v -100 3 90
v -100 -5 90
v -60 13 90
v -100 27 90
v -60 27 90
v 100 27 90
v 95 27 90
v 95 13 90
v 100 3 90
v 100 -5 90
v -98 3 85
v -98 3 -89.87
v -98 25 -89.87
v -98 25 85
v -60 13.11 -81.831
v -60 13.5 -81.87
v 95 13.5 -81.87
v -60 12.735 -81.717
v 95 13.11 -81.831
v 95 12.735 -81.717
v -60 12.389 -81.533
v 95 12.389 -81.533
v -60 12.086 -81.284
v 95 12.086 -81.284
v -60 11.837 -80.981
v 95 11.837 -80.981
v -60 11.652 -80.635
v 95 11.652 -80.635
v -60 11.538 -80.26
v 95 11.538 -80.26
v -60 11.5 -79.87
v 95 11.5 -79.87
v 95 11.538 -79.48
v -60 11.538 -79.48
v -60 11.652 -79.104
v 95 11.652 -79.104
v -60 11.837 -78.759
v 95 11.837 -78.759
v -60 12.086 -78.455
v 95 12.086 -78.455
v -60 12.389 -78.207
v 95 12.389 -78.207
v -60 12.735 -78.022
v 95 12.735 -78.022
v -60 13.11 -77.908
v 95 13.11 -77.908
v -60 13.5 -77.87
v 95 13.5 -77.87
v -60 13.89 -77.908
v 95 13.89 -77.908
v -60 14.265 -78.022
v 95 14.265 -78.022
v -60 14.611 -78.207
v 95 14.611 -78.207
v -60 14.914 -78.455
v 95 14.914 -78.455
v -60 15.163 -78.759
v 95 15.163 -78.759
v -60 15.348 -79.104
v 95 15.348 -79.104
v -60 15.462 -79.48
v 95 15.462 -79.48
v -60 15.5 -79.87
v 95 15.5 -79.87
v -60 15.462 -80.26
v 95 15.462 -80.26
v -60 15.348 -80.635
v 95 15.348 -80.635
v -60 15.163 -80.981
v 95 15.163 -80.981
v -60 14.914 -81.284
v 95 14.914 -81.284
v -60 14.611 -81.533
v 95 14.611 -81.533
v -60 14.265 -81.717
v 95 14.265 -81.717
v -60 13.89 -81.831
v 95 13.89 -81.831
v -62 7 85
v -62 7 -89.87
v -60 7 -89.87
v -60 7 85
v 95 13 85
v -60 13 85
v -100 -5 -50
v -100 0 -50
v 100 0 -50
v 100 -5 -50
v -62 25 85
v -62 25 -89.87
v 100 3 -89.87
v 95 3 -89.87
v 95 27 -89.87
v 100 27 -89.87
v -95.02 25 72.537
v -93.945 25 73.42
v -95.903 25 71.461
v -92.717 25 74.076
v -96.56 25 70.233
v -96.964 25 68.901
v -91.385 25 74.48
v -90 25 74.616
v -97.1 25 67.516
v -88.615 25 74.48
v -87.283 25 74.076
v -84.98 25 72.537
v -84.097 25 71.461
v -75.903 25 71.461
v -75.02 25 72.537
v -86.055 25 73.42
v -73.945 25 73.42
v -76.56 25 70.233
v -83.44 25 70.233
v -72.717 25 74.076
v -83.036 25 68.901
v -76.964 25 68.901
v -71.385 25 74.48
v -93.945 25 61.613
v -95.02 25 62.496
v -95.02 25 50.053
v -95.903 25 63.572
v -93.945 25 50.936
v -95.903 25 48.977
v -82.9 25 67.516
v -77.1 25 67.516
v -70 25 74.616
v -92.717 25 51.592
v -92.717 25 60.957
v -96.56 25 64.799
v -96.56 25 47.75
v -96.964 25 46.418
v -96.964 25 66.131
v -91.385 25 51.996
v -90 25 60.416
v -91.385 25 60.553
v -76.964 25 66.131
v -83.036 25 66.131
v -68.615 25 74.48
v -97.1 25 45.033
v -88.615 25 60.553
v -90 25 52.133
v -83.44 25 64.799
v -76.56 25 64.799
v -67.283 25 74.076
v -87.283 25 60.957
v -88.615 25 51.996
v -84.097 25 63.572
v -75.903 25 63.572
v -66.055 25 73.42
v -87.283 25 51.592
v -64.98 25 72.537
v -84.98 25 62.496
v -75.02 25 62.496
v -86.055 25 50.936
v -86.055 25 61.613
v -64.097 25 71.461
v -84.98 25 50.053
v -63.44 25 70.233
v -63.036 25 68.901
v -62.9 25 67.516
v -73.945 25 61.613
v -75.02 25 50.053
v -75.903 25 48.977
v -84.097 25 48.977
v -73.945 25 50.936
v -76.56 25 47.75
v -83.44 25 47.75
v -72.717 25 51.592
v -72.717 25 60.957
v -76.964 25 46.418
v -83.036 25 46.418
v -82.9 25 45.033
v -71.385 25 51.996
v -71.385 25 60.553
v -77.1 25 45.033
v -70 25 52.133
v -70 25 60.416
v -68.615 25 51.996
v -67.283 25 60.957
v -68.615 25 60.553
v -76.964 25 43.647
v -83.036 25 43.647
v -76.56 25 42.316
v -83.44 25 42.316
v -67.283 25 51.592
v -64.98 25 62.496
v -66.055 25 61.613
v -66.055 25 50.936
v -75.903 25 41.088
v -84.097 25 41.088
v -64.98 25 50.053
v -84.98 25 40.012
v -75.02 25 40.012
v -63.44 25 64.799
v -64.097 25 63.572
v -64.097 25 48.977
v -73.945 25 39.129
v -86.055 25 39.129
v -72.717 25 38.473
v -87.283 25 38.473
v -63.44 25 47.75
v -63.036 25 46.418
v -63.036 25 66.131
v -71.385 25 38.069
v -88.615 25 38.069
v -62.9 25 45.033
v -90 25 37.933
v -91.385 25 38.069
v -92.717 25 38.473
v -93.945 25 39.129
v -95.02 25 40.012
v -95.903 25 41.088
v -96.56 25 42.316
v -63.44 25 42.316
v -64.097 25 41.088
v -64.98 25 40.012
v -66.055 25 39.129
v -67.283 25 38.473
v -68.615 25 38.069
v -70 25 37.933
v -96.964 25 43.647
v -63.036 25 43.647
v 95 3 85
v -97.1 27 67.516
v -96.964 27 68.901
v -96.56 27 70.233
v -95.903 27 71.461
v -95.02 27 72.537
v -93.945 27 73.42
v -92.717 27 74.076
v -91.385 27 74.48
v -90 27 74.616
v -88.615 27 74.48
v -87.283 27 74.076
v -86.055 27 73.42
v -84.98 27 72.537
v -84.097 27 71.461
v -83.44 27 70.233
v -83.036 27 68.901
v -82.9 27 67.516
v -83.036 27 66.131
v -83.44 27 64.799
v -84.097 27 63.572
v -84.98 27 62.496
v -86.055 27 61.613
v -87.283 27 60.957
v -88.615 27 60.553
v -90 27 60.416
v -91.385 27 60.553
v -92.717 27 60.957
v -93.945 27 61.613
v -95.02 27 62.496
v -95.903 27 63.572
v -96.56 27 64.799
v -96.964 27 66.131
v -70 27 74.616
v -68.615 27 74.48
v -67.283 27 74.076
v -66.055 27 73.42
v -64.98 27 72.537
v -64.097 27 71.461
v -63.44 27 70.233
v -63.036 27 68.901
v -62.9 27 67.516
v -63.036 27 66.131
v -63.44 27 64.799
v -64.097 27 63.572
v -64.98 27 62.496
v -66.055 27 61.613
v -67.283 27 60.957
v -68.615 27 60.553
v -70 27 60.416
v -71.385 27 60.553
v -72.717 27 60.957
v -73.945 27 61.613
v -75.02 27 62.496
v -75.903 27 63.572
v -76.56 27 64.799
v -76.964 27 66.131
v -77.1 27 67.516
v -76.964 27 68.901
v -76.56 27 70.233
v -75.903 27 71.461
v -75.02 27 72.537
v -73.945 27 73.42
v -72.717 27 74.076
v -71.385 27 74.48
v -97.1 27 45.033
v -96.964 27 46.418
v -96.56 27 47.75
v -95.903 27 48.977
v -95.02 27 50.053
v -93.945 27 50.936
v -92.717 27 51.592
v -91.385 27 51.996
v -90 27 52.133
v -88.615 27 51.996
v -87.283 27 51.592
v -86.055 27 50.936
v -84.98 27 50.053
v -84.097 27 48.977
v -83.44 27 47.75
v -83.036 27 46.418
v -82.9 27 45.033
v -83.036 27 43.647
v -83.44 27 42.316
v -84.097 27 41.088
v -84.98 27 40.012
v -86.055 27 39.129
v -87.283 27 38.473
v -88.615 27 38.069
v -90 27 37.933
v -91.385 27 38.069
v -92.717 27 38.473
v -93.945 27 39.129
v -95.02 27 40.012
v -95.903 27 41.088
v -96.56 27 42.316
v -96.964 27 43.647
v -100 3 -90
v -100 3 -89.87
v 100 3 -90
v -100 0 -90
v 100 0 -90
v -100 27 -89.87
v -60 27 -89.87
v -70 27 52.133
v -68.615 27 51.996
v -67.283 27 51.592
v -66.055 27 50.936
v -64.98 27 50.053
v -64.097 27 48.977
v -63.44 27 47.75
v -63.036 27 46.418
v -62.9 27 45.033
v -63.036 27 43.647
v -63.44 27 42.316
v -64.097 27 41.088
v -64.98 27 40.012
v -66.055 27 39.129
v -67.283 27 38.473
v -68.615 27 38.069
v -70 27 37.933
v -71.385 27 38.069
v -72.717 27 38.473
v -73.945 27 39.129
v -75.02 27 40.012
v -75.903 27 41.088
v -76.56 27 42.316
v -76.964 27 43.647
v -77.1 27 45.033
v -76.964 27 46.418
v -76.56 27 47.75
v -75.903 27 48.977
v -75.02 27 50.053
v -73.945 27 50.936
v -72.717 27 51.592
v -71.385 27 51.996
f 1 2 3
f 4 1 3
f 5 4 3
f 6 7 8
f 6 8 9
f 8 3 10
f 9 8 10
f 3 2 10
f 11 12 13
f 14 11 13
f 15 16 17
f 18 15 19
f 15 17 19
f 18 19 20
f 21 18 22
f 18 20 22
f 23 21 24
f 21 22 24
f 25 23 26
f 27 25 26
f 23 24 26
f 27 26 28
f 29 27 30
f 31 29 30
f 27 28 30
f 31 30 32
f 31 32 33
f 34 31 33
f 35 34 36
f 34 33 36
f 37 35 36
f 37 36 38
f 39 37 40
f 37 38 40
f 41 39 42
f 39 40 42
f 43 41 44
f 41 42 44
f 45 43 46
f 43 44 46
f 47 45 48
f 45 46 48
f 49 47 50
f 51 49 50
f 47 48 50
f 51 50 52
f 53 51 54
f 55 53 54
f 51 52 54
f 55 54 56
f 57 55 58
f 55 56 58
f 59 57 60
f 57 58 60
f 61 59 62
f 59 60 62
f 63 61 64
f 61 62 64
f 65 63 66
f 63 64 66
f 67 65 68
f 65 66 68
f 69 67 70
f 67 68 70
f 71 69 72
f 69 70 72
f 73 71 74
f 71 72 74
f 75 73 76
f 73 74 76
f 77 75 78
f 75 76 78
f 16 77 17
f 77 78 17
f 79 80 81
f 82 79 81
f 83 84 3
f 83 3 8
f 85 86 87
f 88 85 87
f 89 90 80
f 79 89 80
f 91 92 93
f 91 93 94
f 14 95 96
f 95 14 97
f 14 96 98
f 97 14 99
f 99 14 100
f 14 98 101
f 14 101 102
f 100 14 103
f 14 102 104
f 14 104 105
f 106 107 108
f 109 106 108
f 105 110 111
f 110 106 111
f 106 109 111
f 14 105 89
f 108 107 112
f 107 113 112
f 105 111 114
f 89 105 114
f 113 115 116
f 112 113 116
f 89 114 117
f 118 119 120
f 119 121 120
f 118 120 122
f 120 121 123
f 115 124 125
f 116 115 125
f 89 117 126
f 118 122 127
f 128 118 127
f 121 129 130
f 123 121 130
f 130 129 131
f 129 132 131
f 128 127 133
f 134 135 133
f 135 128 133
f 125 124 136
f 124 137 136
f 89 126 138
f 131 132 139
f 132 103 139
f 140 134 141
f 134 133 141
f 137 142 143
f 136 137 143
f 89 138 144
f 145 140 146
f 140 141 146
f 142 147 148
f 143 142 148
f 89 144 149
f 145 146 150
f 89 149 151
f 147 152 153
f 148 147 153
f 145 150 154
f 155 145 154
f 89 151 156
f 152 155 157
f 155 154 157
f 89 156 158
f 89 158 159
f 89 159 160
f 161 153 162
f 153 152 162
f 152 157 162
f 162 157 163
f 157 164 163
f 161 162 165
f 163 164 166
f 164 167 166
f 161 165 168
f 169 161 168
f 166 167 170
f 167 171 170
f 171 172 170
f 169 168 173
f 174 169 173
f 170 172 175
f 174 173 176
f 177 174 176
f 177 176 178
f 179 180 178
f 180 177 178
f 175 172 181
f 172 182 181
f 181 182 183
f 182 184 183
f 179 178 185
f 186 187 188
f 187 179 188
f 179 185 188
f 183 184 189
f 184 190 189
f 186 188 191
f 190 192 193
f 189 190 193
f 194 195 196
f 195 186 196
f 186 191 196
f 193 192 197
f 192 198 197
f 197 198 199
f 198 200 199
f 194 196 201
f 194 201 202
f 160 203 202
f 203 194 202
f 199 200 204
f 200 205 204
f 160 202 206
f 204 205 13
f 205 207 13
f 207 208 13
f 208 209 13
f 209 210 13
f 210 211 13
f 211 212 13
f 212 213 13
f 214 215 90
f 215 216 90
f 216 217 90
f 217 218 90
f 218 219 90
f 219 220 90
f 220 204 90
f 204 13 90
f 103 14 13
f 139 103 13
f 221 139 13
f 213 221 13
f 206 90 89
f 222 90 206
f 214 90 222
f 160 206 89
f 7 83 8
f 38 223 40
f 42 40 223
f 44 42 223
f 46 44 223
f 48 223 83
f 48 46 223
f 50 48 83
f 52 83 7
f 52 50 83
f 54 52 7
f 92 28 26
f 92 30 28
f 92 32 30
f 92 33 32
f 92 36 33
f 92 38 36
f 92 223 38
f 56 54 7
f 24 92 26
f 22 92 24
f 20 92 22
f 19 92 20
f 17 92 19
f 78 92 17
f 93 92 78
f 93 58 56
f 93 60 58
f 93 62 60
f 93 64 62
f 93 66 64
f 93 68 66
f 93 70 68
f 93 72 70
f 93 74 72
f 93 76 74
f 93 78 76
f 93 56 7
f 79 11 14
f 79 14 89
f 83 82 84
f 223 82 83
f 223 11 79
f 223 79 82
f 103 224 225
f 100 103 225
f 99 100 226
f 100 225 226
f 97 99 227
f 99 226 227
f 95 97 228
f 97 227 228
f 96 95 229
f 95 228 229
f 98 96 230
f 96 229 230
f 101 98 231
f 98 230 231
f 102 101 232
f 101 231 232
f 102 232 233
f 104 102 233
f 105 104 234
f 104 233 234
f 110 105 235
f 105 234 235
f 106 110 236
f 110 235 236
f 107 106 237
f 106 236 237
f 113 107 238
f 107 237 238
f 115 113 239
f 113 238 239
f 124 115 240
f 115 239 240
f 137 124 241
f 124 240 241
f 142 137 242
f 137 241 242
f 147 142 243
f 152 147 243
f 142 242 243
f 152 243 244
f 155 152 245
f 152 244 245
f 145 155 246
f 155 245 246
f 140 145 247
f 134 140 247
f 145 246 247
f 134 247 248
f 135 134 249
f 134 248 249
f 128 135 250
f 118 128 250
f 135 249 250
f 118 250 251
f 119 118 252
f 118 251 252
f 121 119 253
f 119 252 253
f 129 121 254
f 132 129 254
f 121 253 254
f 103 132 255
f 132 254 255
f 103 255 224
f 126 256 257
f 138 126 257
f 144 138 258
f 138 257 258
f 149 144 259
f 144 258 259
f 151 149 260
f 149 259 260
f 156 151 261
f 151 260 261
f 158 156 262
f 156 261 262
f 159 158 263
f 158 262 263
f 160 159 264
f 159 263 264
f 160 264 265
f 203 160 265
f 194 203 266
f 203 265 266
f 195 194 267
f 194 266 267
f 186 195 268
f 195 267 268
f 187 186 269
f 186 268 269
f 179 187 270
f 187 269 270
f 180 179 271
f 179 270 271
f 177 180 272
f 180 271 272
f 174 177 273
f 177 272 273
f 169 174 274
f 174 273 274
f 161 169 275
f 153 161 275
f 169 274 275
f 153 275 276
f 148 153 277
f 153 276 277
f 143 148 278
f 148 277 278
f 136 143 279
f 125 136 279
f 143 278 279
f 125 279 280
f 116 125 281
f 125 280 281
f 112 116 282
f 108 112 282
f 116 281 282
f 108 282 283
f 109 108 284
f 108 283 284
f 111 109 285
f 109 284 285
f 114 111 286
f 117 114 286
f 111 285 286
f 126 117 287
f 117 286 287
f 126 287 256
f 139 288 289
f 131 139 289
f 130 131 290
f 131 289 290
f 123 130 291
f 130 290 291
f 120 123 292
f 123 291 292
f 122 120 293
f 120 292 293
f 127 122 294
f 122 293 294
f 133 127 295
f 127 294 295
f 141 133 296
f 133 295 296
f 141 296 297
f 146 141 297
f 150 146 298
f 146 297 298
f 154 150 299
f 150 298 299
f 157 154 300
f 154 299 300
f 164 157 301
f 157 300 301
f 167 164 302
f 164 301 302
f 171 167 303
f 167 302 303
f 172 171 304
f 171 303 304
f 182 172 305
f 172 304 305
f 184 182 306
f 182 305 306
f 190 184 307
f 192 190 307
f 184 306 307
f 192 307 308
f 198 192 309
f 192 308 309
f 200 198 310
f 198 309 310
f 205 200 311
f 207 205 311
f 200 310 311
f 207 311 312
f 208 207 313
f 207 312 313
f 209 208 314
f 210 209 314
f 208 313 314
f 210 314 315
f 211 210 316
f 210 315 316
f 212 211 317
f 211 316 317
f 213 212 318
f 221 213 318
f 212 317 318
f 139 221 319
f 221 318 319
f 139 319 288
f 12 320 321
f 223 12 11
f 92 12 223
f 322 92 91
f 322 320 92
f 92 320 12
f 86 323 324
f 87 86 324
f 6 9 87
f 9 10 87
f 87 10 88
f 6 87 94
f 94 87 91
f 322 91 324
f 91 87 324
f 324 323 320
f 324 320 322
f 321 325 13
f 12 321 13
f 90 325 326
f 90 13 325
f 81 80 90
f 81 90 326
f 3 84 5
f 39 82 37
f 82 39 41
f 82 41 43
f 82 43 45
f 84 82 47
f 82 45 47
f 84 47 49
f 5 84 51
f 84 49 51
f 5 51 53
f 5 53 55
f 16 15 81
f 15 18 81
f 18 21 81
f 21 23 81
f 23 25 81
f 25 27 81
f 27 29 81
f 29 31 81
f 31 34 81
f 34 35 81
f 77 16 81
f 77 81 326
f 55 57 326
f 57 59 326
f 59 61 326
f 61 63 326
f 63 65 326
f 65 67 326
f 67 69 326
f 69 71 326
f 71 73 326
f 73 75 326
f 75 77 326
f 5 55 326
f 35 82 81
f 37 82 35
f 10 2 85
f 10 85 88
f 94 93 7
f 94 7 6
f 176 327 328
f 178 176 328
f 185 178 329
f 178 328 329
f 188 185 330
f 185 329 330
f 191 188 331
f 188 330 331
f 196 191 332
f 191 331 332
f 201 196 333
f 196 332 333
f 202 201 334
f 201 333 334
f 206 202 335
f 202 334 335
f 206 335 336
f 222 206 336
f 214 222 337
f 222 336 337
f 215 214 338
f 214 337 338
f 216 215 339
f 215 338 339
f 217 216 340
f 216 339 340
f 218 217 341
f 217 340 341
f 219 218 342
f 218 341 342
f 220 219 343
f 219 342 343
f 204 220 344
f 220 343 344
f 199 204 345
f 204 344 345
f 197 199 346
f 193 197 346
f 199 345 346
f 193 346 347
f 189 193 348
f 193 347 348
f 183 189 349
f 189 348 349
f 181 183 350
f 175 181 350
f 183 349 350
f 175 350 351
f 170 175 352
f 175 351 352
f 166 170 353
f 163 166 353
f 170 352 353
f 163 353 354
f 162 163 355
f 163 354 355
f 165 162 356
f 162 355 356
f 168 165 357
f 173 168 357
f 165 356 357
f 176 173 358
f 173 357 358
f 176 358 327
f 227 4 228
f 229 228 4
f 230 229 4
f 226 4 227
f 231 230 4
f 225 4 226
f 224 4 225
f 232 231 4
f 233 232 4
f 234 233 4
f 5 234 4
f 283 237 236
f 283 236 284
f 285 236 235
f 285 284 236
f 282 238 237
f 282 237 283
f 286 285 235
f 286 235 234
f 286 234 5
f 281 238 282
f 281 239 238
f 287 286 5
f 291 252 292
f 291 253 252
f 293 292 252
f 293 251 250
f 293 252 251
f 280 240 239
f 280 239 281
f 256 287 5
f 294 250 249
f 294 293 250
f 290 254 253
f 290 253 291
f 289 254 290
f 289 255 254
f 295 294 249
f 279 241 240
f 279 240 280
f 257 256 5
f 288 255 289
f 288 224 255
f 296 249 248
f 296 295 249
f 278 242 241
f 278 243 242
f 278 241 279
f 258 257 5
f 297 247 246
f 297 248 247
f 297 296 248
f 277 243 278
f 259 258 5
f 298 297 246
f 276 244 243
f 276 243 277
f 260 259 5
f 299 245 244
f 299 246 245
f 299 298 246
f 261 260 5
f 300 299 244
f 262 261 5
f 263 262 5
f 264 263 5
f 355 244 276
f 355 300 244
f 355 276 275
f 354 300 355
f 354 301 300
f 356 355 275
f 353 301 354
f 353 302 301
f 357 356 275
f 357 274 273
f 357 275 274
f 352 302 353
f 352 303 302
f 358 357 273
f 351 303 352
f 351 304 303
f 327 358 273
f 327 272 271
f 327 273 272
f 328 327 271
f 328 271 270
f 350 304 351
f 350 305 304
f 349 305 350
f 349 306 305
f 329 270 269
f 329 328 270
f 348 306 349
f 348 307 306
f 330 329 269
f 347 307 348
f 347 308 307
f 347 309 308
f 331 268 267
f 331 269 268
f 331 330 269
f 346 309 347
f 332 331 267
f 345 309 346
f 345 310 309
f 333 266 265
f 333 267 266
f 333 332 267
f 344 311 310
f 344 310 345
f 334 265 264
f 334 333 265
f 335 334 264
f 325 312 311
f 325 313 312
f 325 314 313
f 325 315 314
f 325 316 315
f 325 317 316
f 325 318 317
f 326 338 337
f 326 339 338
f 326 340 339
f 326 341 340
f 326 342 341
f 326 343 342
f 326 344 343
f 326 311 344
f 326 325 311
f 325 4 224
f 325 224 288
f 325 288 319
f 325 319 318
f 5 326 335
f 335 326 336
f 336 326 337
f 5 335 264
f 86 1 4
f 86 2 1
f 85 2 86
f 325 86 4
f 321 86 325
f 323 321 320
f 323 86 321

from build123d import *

# Parameters (mm, degrees)
SKETCH1_W           = 200
SKETCH1_H           = 180
BOSS_EXTRUDE1_DEPTH = 3
SKETCH2_W           = 200
SKETCH2_H           = 140
BOSS_EXTRUDE2_DEPTH = 5
SKETCH6_W           = 200
SKETCH6_H           = 179.869705491
BOSS_EXTRUDE3_DEPTH = 24
SKETCH7_W           = 155
SKETCH7_H           = 24
CUT_EXTRUDE1_DEPTH  = 179.869705491
SKETCH8_R           = 2
BOSS_EXTRUDE4_DEPTH = 155
SKETCH9_W           = 155
SKETCH9_H           = 5
BOSS_EXTRUDE5_DEPTH = 10
CUT_EXTRUDE3_DEPTH  = 174.869705491
SKETCH12_R          = 7.1
CUT_EXTRUDE4_DEPTH  = 2


with BuildPart() as part:
    # Sketch1 → Boss-Extrude1 (new body)
    with BuildSketch(Plane(origin=(0, 0, 0), x_dir=(1, 0, 0), z_dir=(0, 1, 0))):
        Rectangle(SKETCH1_W, SKETCH1_H)
    extrude(amount=BOSS_EXTRUDE1_DEPTH)

    # Sketch2 → Boss-Extrude2 (add)
    with BuildSketch(Plane.XZ):
        with Locations((0, 20)):
            Rectangle(SKETCH2_W, SKETCH2_H)
    extrude(amount=BOSS_EXTRUDE2_DEPTH)

    # Sketch6 → Boss-Extrude3 (add)
    with BuildSketch(Plane(origin=(0, 3, 0), x_dir=(1, 0, 0), z_dir=(0, 1, 0))):
        with Locations((0, -0.065147254)):
            Rectangle(SKETCH6_W, SKETCH6_H)
    extrude(amount=BOSS_EXTRUDE3_DEPTH)

    # Sketch7 → Cut-Extrude1 (cut)
    with BuildSketch(Plane(origin=(0, 0, -89.869705491), x_dir=(-1, 0, 0), z_dir=(0, 0, -1))):
        with Locations((-17.5, 15)):
            Rectangle(SKETCH7_W, SKETCH7_H)
    extrude(amount=-CUT_EXTRUDE1_DEPTH, mode=Mode.SUBTRACT)

    # Sketch8 → Boss-Extrude4 (add)
    with BuildSketch(Plane.ZY.offset(-95)):
        with Locations(Location((-79.869705491, 13.5, 0), (0, 0, 180))):
            Circle(SKETCH8_R)
    extrude(amount=BOSS_EXTRUDE4_DEPTH)

    # Sketch9 → Boss-Extrude5 (add)
    with BuildSketch(Plane(origin=(0, 3, 0), x_dir=(1, 0, 0), z_dir=(0, 1, 0))):
        with Locations((17.5, -87.5)):
            Rectangle(SKETCH9_W, SKETCH9_H)
    extrude(amount=BOSS_EXTRUDE5_DEPTH)

    # Sketch11 → Cut-Extrude3 (cut)
    with BuildSketch(Plane(origin=(0, 0, -89.869705491), x_dir=(-1, 0, 0), z_dir=(0, 0, -1))):
        Polygon((60, 3), (98, 3), (98, 25), (62, 25), (62, 7), (60, 7), align=None)
    extrude(amount=-CUT_EXTRUDE3_DEPTH, mode=Mode.SUBTRACT)

    # Sketch12 → Cut-Extrude4 (cut)
    with BuildSketch(Plane(origin=(0, 27, 0), x_dir=(1, 0, 0), z_dir=(0, 1, 0))):
        with Locations(Location((-70, -45.032573627, 0), (0, 0, 270))):
            Circle(SKETCH12_R)
        with Locations(Location((-70, -67.516286814, 0), (0, 0, 270))):
            Circle(SKETCH12_R)
        with Locations(Location((-90, -67.516286814, 0), (0, 0, 180))):
            Circle(SKETCH12_R)
        with Locations(Location((-90, -45.032573627, 0), (0, 0, 180))):
            Circle(SKETCH12_R)
    extrude(amount=-CUT_EXTRUDE4_DEPTH, mode=Mode.SUBTRACT)


solid = part.part
